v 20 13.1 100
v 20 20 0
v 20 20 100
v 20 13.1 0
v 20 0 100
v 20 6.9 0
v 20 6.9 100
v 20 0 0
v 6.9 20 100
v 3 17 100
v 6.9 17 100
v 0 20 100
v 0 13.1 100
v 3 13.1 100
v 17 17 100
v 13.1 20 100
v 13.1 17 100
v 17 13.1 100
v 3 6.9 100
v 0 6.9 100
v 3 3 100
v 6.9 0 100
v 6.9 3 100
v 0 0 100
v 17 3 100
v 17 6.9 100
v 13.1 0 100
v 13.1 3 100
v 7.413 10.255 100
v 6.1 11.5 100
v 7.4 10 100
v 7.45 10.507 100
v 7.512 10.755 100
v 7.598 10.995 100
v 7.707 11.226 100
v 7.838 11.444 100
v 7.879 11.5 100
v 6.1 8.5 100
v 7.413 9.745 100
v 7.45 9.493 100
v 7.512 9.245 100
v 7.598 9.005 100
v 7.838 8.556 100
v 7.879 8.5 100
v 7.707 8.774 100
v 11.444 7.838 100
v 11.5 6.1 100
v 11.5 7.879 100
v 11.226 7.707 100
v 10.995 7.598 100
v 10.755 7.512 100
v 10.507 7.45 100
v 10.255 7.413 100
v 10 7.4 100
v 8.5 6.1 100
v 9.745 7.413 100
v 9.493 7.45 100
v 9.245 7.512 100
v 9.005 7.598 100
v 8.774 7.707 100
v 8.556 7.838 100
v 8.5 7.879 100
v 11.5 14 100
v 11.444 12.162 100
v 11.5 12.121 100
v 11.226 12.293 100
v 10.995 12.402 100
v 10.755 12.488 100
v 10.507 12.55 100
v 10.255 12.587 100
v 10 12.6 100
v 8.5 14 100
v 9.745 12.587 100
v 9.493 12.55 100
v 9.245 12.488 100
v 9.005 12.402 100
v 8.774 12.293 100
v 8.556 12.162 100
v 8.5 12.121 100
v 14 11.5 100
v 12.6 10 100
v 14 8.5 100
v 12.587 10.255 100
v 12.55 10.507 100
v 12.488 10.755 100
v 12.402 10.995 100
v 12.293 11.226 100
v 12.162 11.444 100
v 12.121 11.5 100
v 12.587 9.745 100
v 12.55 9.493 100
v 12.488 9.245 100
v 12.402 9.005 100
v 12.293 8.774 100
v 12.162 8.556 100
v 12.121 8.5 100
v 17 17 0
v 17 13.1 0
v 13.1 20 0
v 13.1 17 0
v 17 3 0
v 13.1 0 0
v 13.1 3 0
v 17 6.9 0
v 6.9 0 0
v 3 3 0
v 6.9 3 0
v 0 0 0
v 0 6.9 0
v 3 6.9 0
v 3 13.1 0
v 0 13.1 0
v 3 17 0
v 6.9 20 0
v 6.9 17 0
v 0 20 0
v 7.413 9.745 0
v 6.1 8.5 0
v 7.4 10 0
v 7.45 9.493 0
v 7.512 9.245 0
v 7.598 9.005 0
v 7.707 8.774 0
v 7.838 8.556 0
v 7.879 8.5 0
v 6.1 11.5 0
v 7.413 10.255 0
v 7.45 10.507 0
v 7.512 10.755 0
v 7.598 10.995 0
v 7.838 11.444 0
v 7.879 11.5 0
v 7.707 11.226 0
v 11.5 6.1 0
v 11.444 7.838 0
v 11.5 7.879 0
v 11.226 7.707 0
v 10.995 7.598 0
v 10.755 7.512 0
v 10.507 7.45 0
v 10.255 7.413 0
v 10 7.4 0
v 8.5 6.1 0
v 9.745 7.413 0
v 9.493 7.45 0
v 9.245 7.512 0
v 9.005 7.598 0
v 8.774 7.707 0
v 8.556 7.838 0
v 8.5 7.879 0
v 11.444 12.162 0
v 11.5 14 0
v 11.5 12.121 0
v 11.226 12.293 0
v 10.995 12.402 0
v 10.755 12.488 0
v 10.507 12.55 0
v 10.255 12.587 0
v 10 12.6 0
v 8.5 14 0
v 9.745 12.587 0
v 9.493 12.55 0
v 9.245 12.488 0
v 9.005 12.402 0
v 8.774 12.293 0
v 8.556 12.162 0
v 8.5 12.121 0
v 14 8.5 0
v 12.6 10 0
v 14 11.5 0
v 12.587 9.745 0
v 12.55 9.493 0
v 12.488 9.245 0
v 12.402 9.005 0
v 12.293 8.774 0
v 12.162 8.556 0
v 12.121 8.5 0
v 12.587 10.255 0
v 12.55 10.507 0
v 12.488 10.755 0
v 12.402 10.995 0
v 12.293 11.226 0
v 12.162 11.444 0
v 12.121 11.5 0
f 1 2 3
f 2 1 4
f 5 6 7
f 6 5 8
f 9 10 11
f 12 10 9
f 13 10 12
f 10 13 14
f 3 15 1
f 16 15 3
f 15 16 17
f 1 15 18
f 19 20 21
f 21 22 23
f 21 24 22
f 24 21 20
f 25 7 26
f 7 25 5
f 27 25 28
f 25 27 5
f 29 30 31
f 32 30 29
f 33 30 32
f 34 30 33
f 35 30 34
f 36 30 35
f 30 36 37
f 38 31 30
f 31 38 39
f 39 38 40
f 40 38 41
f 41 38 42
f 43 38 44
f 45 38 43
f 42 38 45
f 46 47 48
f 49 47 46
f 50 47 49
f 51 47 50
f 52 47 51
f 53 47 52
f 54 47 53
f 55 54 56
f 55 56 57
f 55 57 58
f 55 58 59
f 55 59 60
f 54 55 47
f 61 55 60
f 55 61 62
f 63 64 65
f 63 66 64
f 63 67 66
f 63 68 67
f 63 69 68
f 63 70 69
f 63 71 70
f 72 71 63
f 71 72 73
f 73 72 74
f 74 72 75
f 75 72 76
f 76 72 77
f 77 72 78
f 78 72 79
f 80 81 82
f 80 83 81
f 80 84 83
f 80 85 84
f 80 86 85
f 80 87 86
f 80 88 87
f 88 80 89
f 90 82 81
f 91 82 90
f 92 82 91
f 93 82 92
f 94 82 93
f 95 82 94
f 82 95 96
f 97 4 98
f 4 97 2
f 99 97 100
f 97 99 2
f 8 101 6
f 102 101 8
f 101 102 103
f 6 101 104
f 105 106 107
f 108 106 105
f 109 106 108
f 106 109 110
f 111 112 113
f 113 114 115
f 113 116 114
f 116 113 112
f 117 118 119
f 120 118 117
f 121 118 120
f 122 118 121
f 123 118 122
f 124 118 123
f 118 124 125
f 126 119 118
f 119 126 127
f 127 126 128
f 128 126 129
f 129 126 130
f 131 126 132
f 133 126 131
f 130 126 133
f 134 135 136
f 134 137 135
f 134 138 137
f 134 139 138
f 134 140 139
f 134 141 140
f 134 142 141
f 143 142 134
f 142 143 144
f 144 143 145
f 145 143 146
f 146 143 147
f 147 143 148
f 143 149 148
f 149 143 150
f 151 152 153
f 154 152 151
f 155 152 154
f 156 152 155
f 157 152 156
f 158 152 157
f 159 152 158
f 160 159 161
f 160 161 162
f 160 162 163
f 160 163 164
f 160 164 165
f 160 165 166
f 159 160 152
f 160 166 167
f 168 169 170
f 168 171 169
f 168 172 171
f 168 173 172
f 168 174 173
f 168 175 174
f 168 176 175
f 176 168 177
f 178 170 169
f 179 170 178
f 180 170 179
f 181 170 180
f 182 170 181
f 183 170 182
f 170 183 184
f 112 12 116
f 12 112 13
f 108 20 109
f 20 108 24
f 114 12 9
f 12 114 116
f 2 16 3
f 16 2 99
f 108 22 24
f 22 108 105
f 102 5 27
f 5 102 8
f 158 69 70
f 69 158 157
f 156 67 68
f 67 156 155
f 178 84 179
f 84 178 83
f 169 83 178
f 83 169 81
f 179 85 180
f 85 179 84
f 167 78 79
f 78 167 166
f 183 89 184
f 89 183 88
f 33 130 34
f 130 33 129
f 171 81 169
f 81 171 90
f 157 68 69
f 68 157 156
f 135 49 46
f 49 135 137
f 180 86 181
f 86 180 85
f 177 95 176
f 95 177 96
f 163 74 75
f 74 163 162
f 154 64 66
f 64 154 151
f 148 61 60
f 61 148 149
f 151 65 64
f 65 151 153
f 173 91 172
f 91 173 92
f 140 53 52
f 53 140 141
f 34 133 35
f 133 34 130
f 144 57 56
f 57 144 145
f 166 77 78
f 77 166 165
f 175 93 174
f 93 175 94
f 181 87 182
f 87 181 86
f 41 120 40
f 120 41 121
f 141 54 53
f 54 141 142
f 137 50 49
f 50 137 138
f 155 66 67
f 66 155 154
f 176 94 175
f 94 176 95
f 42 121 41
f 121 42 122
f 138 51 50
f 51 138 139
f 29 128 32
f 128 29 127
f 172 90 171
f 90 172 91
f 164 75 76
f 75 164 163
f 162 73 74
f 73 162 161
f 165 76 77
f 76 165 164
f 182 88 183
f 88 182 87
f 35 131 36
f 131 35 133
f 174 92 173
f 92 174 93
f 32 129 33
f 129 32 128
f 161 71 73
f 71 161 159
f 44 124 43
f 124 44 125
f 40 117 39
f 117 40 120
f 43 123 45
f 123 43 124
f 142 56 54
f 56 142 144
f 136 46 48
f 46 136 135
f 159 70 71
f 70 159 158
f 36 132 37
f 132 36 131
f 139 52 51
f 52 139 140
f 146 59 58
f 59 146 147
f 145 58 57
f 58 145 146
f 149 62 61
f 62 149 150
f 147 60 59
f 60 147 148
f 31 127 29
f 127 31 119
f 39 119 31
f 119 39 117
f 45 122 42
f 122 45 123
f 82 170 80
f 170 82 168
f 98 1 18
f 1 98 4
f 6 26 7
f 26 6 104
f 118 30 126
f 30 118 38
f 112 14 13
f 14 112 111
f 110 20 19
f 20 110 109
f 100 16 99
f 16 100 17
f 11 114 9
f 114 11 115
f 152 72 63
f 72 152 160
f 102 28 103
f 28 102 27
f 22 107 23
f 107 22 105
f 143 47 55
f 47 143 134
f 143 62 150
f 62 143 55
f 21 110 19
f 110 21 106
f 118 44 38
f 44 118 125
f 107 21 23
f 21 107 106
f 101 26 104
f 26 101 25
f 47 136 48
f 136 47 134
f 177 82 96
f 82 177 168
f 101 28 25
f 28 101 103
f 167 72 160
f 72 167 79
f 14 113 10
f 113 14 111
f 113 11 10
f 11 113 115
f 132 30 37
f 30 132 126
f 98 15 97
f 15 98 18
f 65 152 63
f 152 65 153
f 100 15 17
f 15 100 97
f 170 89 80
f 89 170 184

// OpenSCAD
$fn=64;

length = 100;
size = 20;

difference() {
    // Outer body
    cube([size, size, length], center=false);

    // Central bore (typical 2020 extrusion)
    translate([size/2, size/2, -0.1])
        cylinder(h=length+0.2, d=5.2);

    // Slot cutouts on each face (approximation)
    slot_w = 6.2;
    slot_d = 6.0;

    // +X face slot
    translate([size - slot_d, (size-slot_w)/2, -0.1])
        cube([slot_d+0.2, slot_w, length+0.2], center=false);

    // -X face slot
    translate([-0.1, (size-slot_w)/2, -0.1])
        cube([slot_d+0.2, slot_w, length+0.2], center=false);

    // +Y face slot
    translate([(size-slot_w)/2, size - slot_d, -0.1])
        cube([slot_w, slot_d+0.2, length+0.2], center=false);

    // -Y face slot
    translate([(size-slot_w)/2, -0.1, -0.1])
        cube([slot_w, slot_d+0.2, length+0.2], center=false);

    // Corner relief pockets (approximation of internal cavities)
    pocket = 5.5;
    inset = 3.0;

    translate([inset, inset, -0.1])
        cube([pocket, pocket, length+0.2], center=false);

    translate([size-inset-pocket, inset, -0.1])
        cube([pocket, pocket, length+0.2], center=false);

    translate([inset, size-inset-pocket, -0.1])
        cube([pocket, pocket, length+0.2], center=false);

    translate([size-inset-pocket, size-inset-pocket, -0.1])
        cube([pocket, pocket, length+0.2], center=false);
}
